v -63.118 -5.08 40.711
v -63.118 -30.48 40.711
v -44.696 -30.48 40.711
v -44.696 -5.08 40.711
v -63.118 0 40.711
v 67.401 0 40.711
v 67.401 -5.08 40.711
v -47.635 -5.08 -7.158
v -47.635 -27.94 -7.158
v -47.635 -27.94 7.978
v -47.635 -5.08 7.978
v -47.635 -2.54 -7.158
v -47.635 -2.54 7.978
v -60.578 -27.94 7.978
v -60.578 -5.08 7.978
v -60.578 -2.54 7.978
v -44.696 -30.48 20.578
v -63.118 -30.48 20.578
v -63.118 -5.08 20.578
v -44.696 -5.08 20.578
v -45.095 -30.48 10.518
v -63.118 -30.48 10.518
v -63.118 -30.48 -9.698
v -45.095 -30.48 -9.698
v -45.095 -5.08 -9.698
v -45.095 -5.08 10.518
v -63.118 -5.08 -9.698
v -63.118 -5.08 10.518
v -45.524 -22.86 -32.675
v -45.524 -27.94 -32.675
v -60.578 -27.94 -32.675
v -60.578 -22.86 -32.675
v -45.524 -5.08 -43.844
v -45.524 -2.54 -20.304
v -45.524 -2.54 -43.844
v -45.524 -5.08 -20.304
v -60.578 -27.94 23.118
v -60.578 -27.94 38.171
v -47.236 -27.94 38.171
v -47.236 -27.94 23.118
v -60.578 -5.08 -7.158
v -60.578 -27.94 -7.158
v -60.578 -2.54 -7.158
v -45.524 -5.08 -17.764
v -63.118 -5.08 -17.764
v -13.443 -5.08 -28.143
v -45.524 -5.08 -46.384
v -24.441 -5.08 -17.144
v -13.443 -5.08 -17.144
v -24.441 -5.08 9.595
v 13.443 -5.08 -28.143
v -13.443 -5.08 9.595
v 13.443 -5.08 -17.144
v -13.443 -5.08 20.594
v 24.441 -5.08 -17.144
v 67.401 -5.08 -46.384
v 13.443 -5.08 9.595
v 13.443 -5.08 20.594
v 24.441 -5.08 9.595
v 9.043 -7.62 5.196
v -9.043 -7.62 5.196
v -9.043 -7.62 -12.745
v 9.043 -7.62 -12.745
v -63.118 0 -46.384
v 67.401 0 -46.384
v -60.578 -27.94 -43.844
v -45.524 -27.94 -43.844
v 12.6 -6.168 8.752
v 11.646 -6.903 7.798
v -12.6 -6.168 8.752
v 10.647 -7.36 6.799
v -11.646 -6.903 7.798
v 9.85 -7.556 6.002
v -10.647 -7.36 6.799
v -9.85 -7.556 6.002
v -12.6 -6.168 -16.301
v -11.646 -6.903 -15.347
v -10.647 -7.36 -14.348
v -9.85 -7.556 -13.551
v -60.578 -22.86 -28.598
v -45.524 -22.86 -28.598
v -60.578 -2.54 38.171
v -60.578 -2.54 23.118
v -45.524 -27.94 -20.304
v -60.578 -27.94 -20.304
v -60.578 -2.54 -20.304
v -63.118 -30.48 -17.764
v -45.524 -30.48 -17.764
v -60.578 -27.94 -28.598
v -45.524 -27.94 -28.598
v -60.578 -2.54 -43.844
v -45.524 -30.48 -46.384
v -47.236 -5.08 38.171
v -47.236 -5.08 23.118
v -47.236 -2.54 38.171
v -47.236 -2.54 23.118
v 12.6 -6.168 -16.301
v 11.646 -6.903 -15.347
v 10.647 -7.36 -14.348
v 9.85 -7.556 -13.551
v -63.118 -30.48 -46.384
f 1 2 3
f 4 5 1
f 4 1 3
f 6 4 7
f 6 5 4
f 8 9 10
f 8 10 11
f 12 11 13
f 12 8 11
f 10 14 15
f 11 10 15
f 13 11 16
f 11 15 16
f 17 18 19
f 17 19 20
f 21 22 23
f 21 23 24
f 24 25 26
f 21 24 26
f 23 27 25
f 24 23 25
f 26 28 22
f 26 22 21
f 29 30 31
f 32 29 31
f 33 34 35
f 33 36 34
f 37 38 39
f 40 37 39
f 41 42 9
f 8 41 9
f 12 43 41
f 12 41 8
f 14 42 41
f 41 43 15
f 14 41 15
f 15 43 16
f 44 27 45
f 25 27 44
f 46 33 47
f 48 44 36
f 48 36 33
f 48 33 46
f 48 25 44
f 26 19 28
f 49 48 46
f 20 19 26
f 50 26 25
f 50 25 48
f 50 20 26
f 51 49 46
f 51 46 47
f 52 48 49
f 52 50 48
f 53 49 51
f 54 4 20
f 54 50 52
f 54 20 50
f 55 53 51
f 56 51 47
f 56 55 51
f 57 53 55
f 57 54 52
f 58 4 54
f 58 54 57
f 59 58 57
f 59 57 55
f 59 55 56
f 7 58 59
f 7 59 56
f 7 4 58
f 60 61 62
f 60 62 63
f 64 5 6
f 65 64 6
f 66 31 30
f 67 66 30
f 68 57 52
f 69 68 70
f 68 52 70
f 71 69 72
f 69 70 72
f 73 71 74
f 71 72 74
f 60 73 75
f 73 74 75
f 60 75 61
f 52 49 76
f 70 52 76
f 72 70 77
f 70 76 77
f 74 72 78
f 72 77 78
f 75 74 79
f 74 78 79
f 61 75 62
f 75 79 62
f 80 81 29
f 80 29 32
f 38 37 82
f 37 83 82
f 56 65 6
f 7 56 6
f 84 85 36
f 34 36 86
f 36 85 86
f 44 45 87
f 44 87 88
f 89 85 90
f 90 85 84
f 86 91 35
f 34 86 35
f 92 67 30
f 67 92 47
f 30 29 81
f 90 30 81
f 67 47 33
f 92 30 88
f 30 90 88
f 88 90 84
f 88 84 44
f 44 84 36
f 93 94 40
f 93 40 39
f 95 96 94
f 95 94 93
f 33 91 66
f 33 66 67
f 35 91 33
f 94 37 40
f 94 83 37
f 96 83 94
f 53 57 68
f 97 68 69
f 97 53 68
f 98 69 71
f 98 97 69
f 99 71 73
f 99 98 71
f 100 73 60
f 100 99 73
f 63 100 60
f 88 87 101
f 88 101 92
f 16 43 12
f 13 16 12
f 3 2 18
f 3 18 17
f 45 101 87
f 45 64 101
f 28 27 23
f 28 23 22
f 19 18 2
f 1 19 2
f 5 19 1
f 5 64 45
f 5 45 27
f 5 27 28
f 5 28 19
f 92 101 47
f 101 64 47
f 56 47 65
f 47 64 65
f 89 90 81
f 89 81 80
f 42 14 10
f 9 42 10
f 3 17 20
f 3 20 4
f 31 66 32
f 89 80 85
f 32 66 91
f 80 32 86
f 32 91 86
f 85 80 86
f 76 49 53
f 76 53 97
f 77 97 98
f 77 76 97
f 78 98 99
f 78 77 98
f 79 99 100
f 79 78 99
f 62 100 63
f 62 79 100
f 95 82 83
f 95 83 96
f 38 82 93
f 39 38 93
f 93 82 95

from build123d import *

# Parameters (mm, degrees)
F0_W         = 130.5194124579
F0_H         = 87.0954208076
F1_DEPTH     = 5.08
F2_W         = 18.4217169881
F2_H         = 20.1326627284
F3_DEPTH     = 25.4
F4_W         = 18.0227532983
F4_H         = 20.2161408961
F5_DEPTH     = 25.4
F6_W         = 17.5940208137
F6_H         = 28.6207161844
F7_DEPTH     = 25.4
F8_T         = 2.54
F8_T3_DEPTH  = 22.6740208137
F8_T5_DEPTH  = 23.1027532983
F8_T7_DEPTH  = 25.2961408961
F8_T9_DEPTH  = 23.5017169881
F8_T11_DEPTH = 25.2126627284
F9_W         = 15.0540208137
F9_H         = 4.0768496692
F10_DEPTH    = 5.08
F11_W        = 26.8854014575
F11_H        = 26.7390697263
F12_DEPTH    = 2.54
F13_T1_DEPTH = 48.8824467137
F13_T3_DEPTH = 48.7361149824


# Not quite as in the source:
# - a fillet or chamfer that OpenCascade refuses, or shapes differently, is made with other operations: its cross-section is extruded or revolved along the edge and cut away or added
# - a shell that OpenCascade refuses in one call is made with other operations: the cavity is built on its own and cut out


with BuildPart() as f1:
    # F0 (on Front) → F1 (new body)
    with BuildSketch(Plane.XZ):
        with Locations((2.1416731179, -2.8366688639)):
            Rectangle(F0_W, F0_H)
    extrude(amount=F1_DEPTH)

    # F2 (on face) → F3 (join)
    with BuildSketch(Plane.XZ.offset(5.08)):
        with Locations((-53.9071746171, 30.6447101757)):
            Rectangle(F2_W, F2_H)
    extrude(amount=F3_DEPTH)

    # F4 (on face) → F5 (join)
    with BuildSketch(Plane.XZ.offset(5.08)):
        with Locations((-54.106656462, 0.4099132493)):
            Rectangle(F4_W, F4_H)
    extrude(amount=F5_DEPTH)

    # F6 (on face) → F7 (join)
    with BuildSketch(Plane.XZ.offset(5.08)):
        with Locations((-54.3210227042, -32.0740211755)):
            Rectangle(F6_W, F6_H)
    extrude(amount=F7_DEPTH)

    # F8: shell of thickness 2.54, made by hand


with BuildPart() as f8_core1:
    # F8_t2: copy of F1
    add(f1.part)

    # the walls: a layer under each face that stays
    f8_faces = [f8_core1.faces().sort_by_distance(p)[0] for p in [
        (-63.1180331111, -15.24, -2.8366688639),
        (2.1416731179, 0, -2.8366688639),
        (67.4013793468, -2.54, -2.8366688639),
        (-53.7952179355, -28.3028571429, -46.3843792677),
        (-54.3210227042, -30.48, -32.0740211755),
        (-54.3210227042, -17.78, -17.7636630833),
        (-54.106656462, -17.78, -9.6981571987),
        (-45.0952798128, -17.78, 0.4099132493),
        (-54.106656462, -30.48, 0.4099132493),
        (-54.106656462, -17.78, 10.5179836974),
        (2.1416731179, -5.08, -2.8366688639),
        (-44.696316123, -17.78, 30.6447101757),
        (-53.9071746171, -17.78, 20.5783788115),
        (-53.9071746171, -30.48, 30.6447101757),
        (58.0785641713, -2.1771428571, 40.7110415399),
    ]]
    thicken(f8_faces, amount=-F8_T, mode=Mode.SUBTRACT)

    # F8_s4 → F8_t3 (cut)
    with BuildSketch(Plane.YZ.offset(-65.6580331111)):
        Polygon((-5.1054, -17.7382630833), (-5.08, -20.3036630833), (-2.54, -20.3036630833), (-2.54, -17.7636630833), align=None)
    extrude(amount=F8_T3_DEPTH, mode=Mode.SUBTRACT)

    # F8_s6 → F8_t5 (cut)
    with BuildSketch(Plane.YZ.offset(-65.6580331111)):
        Polygon((-5.1054, -9.7235571987), (-5.08, -7.1581571987), (-2.54, -7.1581571987), (-2.54, -9.6981571987), align=None)
        Polygon((-5.1054, 10.5433836974), (-5.08, 7.9779836974), (-2.54, 7.9779836974), (-2.54, 10.5179836974), align=None)
    extrude(amount=F8_T5_DEPTH, mode=Mode.SUBTRACT)

    # F8_s8 → F8_t7 (cut)
    with BuildSketch(Plane.XY.offset(-12.2381571987)):
        Polygon((-45.0698798128, -5.1054), (-47.6352798128, -5.08), (-47.6352798128, -2.54), (-45.0952798128, -2.54), align=None)
    extrude(amount=F8_T7_DEPTH, mode=Mode.SUBTRACT)

    # F8_s10 → F8_t9 (cut)
    with BuildSketch(Plane.YZ.offset(-65.6580331111)):
        Polygon((-5.1054, 20.5529788115), (-2.54, 20.5783788115), (-2.54, 23.1183788115), (-5.08, 23.1183788115), align=None)
    extrude(amount=F8_T9_DEPTH, mode=Mode.SUBTRACT)

    # F8_s12 → F8_t11 (cut)
    with BuildSketch(Plane.XY.offset(18.0383788115)):
        Polygon((-44.670916123, -5.1054), (-44.696316123, -2.54), (-47.236316123, -2.54), (-47.236316123, -5.08), align=None)
    extrude(amount=F8_T11_DEPTH, mode=Mode.SUBTRACT)


with BuildPart() as f1_1:
    add(f1.part)

    # what is left inside the walls is the cavity
    f8_cavity = [f8_core1.part.solids().sort_by_distance(p)[0] for p in [
        (-60.552633, -19.473333, 30.64471),
        (-60.552633, -19.473333, -32.074021),
        (-60.552633, -19.473333, 0.409913),
    ]]
    add(f8_cavity, mode=Mode.SUBTRACT)

    # F9 (on face) → F10 (join)
    with BuildSketch(Plane(origin=(0, -27.94, 0), x_dir=(-1, 0, 0), z_dir=(0, 1, 0))):
        with Locations((53.0510227042, -30.6365806609)):
            Rectangle(F9_W, F9_H)
    extrude(amount=F10_DEPTH)

    # F11 (on face) → F12 (join)
    with BuildSketch(Plane.XZ.offset(5.08)):
        with Locations((0, -3.7744471338)):
            Rectangle(F11_W, F11_H)
    extrude(amount=F12_DEPTH)

    # F13: fillet of radius 5.08 on 4 edges, made by hand

    # F13_s2 → F13_t1 (cut)
    with BuildSketch(Plane.YZ.offset(-24.4412233568)):
        with BuildLine():
            ThreePointArc((-5.08, -17.1439819969), (-6.9394090512, -15.2845729457), (-7.62, -12.7445729457))
            Line((-7.62, -12.7445729457), (-7.62, -17.1439819969))
            Line((-7.62, -17.1439819969), (-5.08, -17.1439819969))
        make_face()
        with BuildLine():
            ThreePointArc((-5.08, 9.5950877294), (-6.9394090512, 7.7356786782), (-7.62, 5.1956786782))
            Line((-7.62, 5.1956786782), (-7.62, 9.5950877294))
            Line((-7.62, 9.5950877294), (-5.08, 9.5950877294))
        make_face()
    extrude(amount=F13_T1_DEPTH, mode=Mode.SUBTRACT)

    # F13_s4 → F13_t3 (cut)
    with BuildSketch(Plane.XY.offset(-28.142504625)):
        with BuildLine():
            ThreePointArc((-13.4427007288, -5.08), (-11.5832916775, -6.9394090512), (-9.0432916775, -7.62))
            Line((-9.0432916775, -7.62), (-13.4427007288, -7.62))
            Line((-13.4427007288, -7.62), (-13.4427007288, -5.08))
        make_face()
        with BuildLine():
            ThreePointArc((13.4427007288, -5.08), (11.5832916775, -6.9394090512), (9.0432916775, -7.62))
            Line((9.0432916775, -7.62), (13.4427007288, -7.62))
            Line((13.4427007288, -7.62), (13.4427007288, -5.08))
        make_face()
    extrude(amount=F13_T3_DEPTH, mode=Mode.SUBTRACT)


solid = f1_1.part
